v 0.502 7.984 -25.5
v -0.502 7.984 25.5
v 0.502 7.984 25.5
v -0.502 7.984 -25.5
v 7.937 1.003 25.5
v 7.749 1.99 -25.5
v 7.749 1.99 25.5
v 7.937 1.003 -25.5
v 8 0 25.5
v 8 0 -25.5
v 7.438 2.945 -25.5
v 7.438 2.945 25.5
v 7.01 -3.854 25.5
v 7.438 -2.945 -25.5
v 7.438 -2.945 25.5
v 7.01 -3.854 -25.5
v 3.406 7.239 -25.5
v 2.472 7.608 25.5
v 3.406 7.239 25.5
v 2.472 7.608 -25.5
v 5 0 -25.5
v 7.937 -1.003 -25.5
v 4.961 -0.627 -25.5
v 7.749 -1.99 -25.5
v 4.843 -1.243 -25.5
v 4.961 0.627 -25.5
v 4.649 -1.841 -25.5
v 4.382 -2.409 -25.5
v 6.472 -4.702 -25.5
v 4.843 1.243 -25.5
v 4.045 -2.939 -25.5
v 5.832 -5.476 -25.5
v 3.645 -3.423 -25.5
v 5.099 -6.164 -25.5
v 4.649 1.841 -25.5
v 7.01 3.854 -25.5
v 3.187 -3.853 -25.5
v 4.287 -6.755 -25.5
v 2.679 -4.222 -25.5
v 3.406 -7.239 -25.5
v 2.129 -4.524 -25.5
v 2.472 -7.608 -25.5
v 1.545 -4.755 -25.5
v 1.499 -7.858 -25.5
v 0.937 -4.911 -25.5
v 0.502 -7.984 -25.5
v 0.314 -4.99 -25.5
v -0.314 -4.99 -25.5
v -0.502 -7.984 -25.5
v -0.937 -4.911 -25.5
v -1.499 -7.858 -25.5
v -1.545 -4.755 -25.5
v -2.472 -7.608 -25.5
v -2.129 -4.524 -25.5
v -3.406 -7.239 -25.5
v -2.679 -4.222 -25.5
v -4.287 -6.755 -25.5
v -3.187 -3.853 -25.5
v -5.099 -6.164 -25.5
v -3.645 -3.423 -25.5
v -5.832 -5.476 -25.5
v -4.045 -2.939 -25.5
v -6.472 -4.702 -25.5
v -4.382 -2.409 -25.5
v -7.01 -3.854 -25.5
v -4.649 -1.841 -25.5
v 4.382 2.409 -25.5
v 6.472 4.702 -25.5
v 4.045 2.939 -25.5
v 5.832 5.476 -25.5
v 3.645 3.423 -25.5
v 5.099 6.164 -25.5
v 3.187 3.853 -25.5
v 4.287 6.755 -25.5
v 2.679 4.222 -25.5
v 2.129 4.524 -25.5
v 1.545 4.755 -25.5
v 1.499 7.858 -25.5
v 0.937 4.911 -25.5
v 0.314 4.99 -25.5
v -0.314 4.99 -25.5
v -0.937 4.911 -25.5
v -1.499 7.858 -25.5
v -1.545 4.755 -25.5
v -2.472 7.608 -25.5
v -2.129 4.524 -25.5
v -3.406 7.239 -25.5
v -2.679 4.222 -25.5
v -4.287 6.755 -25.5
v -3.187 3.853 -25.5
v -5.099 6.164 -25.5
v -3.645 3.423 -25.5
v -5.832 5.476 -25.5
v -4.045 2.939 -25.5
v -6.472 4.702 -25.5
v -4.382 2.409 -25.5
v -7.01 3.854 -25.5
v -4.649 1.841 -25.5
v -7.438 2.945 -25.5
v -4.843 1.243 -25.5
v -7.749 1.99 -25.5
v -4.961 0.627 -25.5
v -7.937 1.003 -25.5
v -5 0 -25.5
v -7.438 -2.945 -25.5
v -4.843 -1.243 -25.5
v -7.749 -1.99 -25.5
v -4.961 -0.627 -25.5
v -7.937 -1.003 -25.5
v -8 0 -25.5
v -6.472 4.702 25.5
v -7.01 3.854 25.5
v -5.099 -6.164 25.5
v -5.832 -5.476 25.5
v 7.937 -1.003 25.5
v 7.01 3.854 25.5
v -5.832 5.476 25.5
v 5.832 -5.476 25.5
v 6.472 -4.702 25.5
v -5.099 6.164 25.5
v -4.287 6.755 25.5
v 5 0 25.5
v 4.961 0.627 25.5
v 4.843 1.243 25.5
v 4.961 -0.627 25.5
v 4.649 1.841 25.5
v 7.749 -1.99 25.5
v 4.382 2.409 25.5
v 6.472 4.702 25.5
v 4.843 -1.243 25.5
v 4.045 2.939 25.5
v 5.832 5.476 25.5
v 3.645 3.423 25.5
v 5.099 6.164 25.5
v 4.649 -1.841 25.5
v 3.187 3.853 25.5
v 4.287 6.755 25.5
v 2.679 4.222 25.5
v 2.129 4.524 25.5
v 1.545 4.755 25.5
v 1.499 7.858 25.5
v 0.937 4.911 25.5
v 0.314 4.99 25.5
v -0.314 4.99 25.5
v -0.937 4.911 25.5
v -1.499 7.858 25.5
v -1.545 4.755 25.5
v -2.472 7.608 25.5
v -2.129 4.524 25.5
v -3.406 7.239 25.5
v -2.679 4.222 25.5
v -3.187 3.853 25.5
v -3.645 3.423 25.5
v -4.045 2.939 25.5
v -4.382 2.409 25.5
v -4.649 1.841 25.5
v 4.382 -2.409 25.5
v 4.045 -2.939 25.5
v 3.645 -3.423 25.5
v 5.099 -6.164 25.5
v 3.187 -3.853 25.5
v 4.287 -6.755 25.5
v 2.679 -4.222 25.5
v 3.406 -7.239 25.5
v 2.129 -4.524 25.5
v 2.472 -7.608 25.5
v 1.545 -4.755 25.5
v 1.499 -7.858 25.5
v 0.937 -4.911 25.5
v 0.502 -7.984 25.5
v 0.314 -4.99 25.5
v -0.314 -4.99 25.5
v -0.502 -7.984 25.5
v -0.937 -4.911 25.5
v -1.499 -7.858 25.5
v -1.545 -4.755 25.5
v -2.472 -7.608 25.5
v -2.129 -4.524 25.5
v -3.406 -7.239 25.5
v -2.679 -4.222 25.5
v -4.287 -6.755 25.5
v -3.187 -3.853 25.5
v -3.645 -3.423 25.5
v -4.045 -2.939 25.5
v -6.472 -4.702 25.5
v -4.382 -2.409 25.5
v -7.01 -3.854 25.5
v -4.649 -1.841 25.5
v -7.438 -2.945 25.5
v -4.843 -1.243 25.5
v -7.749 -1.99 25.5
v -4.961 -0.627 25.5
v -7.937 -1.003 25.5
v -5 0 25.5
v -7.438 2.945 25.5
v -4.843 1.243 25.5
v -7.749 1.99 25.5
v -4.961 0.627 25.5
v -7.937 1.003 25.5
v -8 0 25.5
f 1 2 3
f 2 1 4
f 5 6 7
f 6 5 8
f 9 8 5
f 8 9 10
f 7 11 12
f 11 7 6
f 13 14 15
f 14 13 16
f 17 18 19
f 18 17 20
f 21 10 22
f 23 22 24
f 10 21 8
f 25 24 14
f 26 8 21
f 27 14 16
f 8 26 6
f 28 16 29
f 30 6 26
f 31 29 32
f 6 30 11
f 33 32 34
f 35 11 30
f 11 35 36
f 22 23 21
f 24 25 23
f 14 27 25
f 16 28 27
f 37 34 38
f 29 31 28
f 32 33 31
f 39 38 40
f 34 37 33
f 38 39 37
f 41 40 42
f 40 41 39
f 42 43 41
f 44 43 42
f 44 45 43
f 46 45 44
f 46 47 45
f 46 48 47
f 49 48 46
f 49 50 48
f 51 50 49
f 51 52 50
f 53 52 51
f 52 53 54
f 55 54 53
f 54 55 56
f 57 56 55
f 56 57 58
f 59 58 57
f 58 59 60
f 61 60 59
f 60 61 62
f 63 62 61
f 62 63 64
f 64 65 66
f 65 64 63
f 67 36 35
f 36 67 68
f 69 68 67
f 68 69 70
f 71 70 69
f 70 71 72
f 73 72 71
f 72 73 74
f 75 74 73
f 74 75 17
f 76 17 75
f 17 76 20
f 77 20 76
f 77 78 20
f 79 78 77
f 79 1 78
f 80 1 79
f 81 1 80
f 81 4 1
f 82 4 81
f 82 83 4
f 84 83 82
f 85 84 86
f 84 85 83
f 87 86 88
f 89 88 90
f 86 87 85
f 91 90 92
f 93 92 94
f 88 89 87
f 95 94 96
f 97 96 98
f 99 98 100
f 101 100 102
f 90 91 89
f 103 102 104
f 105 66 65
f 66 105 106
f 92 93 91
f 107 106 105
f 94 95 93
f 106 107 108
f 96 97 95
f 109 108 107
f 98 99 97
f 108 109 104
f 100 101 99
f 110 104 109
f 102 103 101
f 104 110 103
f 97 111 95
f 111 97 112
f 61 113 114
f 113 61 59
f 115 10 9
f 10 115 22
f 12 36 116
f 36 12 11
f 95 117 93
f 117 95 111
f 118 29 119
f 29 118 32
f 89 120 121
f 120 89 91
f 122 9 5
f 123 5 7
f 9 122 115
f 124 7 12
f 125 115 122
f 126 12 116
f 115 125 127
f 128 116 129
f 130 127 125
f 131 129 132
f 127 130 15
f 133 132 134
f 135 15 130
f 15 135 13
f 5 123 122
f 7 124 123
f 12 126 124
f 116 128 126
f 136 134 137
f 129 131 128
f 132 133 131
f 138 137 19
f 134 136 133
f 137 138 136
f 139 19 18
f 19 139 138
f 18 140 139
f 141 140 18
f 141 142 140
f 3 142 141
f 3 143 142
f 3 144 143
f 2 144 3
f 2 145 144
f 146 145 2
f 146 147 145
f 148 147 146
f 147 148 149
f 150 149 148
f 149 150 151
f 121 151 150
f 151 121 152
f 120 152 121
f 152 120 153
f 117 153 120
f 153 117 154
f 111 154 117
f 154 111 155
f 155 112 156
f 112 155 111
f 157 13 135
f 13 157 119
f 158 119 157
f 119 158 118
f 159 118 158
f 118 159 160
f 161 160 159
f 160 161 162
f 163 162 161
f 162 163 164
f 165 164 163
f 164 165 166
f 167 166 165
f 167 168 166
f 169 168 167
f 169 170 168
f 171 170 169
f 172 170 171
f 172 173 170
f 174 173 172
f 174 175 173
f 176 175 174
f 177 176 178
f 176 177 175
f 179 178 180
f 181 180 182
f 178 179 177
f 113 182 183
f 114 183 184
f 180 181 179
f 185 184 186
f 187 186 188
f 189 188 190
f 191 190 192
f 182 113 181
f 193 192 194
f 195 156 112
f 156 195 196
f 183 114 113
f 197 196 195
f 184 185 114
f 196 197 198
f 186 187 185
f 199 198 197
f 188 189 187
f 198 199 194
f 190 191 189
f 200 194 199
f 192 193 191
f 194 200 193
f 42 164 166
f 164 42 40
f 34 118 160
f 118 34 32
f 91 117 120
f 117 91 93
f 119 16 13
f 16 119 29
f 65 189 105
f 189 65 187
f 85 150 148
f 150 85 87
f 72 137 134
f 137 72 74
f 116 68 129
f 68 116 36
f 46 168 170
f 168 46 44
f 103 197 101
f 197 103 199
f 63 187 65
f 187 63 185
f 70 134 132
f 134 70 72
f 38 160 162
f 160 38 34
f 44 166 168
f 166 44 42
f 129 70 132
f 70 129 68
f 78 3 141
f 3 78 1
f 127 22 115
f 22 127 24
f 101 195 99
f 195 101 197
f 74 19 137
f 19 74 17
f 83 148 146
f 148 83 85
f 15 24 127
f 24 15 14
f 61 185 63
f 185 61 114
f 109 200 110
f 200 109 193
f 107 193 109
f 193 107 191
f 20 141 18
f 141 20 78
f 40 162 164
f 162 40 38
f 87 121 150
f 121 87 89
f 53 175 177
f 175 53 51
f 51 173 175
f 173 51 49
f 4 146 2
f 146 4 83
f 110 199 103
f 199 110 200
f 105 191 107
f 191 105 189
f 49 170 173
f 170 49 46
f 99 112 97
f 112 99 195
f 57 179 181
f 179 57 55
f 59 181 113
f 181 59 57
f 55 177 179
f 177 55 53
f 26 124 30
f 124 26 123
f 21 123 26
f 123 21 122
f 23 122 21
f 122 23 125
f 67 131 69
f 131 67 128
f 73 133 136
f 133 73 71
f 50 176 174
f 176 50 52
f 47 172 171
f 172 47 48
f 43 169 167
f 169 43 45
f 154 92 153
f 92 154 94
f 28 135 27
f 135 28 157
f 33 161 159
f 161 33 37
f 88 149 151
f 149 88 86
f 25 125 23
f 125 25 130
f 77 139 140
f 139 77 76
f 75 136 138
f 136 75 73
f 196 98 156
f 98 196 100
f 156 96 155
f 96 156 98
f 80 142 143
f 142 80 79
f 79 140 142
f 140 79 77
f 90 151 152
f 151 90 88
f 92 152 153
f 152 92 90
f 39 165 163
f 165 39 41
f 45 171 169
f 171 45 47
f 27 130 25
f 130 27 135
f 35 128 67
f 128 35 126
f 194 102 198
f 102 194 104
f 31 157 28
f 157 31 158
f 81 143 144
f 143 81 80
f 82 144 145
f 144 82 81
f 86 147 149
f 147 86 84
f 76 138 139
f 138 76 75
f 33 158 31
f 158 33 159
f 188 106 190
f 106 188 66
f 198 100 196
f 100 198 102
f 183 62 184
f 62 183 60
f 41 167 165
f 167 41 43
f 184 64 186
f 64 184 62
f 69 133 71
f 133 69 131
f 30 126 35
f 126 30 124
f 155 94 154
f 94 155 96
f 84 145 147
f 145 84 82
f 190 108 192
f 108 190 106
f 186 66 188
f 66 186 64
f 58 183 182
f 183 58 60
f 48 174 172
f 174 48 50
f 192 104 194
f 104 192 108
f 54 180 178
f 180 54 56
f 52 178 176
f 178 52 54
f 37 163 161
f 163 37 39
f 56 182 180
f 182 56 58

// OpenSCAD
$fn = 50;


difference() {
	union() {
		translate(v = [0, 0, -25.5000000000]) {
			cylinder(h = 51, r = 8.0000000000);
		}
	}
	union() {
		translate(v = [0, 0, -100.0000000000]) {
			cylinder(h = 200, r = 5.0000000000);
		}
	}
}
